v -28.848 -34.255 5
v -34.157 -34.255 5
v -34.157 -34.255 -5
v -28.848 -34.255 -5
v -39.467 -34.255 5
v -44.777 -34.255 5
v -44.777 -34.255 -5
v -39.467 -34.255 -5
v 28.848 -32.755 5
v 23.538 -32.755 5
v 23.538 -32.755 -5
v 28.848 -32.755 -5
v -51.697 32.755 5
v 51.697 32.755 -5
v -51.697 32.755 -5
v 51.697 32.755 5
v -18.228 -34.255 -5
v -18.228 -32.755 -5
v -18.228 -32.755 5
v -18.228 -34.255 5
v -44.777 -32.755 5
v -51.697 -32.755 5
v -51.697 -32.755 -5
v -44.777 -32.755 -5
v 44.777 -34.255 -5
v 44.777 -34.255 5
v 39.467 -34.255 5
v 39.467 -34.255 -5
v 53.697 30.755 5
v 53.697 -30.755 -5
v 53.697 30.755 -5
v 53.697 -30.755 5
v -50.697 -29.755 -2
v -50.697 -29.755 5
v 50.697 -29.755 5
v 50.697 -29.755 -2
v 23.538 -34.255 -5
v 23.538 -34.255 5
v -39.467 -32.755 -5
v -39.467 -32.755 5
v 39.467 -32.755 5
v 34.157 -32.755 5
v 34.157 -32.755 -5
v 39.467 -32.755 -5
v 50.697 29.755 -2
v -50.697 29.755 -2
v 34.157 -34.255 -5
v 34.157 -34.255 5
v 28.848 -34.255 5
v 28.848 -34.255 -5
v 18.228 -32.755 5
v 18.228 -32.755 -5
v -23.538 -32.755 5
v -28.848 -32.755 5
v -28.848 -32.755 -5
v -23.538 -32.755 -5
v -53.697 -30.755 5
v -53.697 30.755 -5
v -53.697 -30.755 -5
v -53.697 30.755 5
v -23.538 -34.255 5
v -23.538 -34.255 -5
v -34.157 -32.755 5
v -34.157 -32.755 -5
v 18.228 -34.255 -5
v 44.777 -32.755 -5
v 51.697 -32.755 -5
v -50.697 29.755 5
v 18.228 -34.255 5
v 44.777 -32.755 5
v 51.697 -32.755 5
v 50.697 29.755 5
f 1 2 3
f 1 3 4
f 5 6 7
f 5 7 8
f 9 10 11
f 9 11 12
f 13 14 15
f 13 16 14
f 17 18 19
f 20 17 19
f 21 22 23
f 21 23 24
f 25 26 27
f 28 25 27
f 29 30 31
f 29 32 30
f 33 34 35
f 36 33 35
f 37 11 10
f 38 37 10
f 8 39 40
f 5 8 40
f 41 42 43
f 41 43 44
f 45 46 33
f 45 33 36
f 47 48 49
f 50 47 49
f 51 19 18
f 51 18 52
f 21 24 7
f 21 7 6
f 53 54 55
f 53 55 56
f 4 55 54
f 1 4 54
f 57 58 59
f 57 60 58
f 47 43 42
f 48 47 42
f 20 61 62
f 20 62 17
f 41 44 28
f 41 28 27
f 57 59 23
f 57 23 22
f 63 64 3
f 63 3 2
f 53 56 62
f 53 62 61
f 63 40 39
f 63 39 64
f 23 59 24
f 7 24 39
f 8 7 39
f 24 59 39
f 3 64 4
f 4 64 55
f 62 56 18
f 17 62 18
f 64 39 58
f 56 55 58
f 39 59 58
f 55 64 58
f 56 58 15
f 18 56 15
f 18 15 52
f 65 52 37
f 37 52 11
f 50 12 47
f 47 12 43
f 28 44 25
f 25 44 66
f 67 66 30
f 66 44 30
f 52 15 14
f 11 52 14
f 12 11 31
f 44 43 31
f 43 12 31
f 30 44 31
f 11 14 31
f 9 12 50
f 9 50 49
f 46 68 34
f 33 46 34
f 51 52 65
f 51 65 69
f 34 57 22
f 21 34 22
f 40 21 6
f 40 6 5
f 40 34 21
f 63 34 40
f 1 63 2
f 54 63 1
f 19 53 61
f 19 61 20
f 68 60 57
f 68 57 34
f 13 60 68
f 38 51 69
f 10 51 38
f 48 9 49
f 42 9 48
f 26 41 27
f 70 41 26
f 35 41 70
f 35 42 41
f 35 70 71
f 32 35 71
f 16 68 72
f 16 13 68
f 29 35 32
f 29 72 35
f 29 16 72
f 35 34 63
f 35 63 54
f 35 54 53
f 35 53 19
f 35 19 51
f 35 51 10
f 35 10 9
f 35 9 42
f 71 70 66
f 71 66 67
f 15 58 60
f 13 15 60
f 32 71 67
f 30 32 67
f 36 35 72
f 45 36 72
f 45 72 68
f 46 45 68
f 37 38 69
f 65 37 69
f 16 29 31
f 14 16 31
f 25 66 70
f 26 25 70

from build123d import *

# Parameters (mm, degrees)
F1_DEPTH = 5
F2_T     = -3
F3_SIZE  = 2
F4_W     = 5.3098537028
F4_H     = 10
F5_DEPTH = 1.5


# Not quite as in the source:
# - a pattern or mirror of a feature is missing from the dataset's text; its kind, count and spacing are read off the source's solid


with BuildPart() as f1:
    # F0 (on Top) → F1 (new body, symmetric)
    with BuildSketch(Plane.XY):
        Polygon((53.696885705, 32.7549055219), (0, 32.7549055219), (-53.696885705, 32.7549055219), (-53.696885705, 0), (-53.696885705, -32.7549055219), (0, -32.7549055219), (53.696885705, -32.7549055219), (53.696885705, 0), align=None)
    extrude(amount=F1_DEPTH, both=True)

    # F2
    f2_openings = [f1.faces().sort_by_distance(p)[0] for p in [
        (0, 0, 5),
    ]]
    offset(amount=F2_T, openings=f2_openings)

    # F3
    f3_edges = [f1.edges().sort_by_distance(p)[0] for p in [
        (53.696886, -32.754906, 0),
        (-53.696886, 32.754906, 0),
        (53.696886, 32.754906, 0),
        (-53.696886, -32.754906, 0),
    ]]
    chamfer(f3_edges, length=F3_SIZE)

    # F4 (on face) → F5 (join)
    with BuildSketch(Plane.XZ.offset(32.7549055219)):
        with Locations((-42.1222578734, 0)):
            Rectangle(F4_W, F4_H)
        with Locations((-31.5025504678, 0)):
            Rectangle(F4_W, F4_H)
        with Locations((-20.8828430623, 0)):
            Rectangle(F4_W, F4_H)
    f5 = extrude(amount=F5_DEPTH)

    # F5_copies: F5 across plane
    add(f5.mirror(Plane(origin=(0, 0, 0), x_dir=(0, 0, 1), z_dir=(1, 0, 0))))


solid = f1.part
